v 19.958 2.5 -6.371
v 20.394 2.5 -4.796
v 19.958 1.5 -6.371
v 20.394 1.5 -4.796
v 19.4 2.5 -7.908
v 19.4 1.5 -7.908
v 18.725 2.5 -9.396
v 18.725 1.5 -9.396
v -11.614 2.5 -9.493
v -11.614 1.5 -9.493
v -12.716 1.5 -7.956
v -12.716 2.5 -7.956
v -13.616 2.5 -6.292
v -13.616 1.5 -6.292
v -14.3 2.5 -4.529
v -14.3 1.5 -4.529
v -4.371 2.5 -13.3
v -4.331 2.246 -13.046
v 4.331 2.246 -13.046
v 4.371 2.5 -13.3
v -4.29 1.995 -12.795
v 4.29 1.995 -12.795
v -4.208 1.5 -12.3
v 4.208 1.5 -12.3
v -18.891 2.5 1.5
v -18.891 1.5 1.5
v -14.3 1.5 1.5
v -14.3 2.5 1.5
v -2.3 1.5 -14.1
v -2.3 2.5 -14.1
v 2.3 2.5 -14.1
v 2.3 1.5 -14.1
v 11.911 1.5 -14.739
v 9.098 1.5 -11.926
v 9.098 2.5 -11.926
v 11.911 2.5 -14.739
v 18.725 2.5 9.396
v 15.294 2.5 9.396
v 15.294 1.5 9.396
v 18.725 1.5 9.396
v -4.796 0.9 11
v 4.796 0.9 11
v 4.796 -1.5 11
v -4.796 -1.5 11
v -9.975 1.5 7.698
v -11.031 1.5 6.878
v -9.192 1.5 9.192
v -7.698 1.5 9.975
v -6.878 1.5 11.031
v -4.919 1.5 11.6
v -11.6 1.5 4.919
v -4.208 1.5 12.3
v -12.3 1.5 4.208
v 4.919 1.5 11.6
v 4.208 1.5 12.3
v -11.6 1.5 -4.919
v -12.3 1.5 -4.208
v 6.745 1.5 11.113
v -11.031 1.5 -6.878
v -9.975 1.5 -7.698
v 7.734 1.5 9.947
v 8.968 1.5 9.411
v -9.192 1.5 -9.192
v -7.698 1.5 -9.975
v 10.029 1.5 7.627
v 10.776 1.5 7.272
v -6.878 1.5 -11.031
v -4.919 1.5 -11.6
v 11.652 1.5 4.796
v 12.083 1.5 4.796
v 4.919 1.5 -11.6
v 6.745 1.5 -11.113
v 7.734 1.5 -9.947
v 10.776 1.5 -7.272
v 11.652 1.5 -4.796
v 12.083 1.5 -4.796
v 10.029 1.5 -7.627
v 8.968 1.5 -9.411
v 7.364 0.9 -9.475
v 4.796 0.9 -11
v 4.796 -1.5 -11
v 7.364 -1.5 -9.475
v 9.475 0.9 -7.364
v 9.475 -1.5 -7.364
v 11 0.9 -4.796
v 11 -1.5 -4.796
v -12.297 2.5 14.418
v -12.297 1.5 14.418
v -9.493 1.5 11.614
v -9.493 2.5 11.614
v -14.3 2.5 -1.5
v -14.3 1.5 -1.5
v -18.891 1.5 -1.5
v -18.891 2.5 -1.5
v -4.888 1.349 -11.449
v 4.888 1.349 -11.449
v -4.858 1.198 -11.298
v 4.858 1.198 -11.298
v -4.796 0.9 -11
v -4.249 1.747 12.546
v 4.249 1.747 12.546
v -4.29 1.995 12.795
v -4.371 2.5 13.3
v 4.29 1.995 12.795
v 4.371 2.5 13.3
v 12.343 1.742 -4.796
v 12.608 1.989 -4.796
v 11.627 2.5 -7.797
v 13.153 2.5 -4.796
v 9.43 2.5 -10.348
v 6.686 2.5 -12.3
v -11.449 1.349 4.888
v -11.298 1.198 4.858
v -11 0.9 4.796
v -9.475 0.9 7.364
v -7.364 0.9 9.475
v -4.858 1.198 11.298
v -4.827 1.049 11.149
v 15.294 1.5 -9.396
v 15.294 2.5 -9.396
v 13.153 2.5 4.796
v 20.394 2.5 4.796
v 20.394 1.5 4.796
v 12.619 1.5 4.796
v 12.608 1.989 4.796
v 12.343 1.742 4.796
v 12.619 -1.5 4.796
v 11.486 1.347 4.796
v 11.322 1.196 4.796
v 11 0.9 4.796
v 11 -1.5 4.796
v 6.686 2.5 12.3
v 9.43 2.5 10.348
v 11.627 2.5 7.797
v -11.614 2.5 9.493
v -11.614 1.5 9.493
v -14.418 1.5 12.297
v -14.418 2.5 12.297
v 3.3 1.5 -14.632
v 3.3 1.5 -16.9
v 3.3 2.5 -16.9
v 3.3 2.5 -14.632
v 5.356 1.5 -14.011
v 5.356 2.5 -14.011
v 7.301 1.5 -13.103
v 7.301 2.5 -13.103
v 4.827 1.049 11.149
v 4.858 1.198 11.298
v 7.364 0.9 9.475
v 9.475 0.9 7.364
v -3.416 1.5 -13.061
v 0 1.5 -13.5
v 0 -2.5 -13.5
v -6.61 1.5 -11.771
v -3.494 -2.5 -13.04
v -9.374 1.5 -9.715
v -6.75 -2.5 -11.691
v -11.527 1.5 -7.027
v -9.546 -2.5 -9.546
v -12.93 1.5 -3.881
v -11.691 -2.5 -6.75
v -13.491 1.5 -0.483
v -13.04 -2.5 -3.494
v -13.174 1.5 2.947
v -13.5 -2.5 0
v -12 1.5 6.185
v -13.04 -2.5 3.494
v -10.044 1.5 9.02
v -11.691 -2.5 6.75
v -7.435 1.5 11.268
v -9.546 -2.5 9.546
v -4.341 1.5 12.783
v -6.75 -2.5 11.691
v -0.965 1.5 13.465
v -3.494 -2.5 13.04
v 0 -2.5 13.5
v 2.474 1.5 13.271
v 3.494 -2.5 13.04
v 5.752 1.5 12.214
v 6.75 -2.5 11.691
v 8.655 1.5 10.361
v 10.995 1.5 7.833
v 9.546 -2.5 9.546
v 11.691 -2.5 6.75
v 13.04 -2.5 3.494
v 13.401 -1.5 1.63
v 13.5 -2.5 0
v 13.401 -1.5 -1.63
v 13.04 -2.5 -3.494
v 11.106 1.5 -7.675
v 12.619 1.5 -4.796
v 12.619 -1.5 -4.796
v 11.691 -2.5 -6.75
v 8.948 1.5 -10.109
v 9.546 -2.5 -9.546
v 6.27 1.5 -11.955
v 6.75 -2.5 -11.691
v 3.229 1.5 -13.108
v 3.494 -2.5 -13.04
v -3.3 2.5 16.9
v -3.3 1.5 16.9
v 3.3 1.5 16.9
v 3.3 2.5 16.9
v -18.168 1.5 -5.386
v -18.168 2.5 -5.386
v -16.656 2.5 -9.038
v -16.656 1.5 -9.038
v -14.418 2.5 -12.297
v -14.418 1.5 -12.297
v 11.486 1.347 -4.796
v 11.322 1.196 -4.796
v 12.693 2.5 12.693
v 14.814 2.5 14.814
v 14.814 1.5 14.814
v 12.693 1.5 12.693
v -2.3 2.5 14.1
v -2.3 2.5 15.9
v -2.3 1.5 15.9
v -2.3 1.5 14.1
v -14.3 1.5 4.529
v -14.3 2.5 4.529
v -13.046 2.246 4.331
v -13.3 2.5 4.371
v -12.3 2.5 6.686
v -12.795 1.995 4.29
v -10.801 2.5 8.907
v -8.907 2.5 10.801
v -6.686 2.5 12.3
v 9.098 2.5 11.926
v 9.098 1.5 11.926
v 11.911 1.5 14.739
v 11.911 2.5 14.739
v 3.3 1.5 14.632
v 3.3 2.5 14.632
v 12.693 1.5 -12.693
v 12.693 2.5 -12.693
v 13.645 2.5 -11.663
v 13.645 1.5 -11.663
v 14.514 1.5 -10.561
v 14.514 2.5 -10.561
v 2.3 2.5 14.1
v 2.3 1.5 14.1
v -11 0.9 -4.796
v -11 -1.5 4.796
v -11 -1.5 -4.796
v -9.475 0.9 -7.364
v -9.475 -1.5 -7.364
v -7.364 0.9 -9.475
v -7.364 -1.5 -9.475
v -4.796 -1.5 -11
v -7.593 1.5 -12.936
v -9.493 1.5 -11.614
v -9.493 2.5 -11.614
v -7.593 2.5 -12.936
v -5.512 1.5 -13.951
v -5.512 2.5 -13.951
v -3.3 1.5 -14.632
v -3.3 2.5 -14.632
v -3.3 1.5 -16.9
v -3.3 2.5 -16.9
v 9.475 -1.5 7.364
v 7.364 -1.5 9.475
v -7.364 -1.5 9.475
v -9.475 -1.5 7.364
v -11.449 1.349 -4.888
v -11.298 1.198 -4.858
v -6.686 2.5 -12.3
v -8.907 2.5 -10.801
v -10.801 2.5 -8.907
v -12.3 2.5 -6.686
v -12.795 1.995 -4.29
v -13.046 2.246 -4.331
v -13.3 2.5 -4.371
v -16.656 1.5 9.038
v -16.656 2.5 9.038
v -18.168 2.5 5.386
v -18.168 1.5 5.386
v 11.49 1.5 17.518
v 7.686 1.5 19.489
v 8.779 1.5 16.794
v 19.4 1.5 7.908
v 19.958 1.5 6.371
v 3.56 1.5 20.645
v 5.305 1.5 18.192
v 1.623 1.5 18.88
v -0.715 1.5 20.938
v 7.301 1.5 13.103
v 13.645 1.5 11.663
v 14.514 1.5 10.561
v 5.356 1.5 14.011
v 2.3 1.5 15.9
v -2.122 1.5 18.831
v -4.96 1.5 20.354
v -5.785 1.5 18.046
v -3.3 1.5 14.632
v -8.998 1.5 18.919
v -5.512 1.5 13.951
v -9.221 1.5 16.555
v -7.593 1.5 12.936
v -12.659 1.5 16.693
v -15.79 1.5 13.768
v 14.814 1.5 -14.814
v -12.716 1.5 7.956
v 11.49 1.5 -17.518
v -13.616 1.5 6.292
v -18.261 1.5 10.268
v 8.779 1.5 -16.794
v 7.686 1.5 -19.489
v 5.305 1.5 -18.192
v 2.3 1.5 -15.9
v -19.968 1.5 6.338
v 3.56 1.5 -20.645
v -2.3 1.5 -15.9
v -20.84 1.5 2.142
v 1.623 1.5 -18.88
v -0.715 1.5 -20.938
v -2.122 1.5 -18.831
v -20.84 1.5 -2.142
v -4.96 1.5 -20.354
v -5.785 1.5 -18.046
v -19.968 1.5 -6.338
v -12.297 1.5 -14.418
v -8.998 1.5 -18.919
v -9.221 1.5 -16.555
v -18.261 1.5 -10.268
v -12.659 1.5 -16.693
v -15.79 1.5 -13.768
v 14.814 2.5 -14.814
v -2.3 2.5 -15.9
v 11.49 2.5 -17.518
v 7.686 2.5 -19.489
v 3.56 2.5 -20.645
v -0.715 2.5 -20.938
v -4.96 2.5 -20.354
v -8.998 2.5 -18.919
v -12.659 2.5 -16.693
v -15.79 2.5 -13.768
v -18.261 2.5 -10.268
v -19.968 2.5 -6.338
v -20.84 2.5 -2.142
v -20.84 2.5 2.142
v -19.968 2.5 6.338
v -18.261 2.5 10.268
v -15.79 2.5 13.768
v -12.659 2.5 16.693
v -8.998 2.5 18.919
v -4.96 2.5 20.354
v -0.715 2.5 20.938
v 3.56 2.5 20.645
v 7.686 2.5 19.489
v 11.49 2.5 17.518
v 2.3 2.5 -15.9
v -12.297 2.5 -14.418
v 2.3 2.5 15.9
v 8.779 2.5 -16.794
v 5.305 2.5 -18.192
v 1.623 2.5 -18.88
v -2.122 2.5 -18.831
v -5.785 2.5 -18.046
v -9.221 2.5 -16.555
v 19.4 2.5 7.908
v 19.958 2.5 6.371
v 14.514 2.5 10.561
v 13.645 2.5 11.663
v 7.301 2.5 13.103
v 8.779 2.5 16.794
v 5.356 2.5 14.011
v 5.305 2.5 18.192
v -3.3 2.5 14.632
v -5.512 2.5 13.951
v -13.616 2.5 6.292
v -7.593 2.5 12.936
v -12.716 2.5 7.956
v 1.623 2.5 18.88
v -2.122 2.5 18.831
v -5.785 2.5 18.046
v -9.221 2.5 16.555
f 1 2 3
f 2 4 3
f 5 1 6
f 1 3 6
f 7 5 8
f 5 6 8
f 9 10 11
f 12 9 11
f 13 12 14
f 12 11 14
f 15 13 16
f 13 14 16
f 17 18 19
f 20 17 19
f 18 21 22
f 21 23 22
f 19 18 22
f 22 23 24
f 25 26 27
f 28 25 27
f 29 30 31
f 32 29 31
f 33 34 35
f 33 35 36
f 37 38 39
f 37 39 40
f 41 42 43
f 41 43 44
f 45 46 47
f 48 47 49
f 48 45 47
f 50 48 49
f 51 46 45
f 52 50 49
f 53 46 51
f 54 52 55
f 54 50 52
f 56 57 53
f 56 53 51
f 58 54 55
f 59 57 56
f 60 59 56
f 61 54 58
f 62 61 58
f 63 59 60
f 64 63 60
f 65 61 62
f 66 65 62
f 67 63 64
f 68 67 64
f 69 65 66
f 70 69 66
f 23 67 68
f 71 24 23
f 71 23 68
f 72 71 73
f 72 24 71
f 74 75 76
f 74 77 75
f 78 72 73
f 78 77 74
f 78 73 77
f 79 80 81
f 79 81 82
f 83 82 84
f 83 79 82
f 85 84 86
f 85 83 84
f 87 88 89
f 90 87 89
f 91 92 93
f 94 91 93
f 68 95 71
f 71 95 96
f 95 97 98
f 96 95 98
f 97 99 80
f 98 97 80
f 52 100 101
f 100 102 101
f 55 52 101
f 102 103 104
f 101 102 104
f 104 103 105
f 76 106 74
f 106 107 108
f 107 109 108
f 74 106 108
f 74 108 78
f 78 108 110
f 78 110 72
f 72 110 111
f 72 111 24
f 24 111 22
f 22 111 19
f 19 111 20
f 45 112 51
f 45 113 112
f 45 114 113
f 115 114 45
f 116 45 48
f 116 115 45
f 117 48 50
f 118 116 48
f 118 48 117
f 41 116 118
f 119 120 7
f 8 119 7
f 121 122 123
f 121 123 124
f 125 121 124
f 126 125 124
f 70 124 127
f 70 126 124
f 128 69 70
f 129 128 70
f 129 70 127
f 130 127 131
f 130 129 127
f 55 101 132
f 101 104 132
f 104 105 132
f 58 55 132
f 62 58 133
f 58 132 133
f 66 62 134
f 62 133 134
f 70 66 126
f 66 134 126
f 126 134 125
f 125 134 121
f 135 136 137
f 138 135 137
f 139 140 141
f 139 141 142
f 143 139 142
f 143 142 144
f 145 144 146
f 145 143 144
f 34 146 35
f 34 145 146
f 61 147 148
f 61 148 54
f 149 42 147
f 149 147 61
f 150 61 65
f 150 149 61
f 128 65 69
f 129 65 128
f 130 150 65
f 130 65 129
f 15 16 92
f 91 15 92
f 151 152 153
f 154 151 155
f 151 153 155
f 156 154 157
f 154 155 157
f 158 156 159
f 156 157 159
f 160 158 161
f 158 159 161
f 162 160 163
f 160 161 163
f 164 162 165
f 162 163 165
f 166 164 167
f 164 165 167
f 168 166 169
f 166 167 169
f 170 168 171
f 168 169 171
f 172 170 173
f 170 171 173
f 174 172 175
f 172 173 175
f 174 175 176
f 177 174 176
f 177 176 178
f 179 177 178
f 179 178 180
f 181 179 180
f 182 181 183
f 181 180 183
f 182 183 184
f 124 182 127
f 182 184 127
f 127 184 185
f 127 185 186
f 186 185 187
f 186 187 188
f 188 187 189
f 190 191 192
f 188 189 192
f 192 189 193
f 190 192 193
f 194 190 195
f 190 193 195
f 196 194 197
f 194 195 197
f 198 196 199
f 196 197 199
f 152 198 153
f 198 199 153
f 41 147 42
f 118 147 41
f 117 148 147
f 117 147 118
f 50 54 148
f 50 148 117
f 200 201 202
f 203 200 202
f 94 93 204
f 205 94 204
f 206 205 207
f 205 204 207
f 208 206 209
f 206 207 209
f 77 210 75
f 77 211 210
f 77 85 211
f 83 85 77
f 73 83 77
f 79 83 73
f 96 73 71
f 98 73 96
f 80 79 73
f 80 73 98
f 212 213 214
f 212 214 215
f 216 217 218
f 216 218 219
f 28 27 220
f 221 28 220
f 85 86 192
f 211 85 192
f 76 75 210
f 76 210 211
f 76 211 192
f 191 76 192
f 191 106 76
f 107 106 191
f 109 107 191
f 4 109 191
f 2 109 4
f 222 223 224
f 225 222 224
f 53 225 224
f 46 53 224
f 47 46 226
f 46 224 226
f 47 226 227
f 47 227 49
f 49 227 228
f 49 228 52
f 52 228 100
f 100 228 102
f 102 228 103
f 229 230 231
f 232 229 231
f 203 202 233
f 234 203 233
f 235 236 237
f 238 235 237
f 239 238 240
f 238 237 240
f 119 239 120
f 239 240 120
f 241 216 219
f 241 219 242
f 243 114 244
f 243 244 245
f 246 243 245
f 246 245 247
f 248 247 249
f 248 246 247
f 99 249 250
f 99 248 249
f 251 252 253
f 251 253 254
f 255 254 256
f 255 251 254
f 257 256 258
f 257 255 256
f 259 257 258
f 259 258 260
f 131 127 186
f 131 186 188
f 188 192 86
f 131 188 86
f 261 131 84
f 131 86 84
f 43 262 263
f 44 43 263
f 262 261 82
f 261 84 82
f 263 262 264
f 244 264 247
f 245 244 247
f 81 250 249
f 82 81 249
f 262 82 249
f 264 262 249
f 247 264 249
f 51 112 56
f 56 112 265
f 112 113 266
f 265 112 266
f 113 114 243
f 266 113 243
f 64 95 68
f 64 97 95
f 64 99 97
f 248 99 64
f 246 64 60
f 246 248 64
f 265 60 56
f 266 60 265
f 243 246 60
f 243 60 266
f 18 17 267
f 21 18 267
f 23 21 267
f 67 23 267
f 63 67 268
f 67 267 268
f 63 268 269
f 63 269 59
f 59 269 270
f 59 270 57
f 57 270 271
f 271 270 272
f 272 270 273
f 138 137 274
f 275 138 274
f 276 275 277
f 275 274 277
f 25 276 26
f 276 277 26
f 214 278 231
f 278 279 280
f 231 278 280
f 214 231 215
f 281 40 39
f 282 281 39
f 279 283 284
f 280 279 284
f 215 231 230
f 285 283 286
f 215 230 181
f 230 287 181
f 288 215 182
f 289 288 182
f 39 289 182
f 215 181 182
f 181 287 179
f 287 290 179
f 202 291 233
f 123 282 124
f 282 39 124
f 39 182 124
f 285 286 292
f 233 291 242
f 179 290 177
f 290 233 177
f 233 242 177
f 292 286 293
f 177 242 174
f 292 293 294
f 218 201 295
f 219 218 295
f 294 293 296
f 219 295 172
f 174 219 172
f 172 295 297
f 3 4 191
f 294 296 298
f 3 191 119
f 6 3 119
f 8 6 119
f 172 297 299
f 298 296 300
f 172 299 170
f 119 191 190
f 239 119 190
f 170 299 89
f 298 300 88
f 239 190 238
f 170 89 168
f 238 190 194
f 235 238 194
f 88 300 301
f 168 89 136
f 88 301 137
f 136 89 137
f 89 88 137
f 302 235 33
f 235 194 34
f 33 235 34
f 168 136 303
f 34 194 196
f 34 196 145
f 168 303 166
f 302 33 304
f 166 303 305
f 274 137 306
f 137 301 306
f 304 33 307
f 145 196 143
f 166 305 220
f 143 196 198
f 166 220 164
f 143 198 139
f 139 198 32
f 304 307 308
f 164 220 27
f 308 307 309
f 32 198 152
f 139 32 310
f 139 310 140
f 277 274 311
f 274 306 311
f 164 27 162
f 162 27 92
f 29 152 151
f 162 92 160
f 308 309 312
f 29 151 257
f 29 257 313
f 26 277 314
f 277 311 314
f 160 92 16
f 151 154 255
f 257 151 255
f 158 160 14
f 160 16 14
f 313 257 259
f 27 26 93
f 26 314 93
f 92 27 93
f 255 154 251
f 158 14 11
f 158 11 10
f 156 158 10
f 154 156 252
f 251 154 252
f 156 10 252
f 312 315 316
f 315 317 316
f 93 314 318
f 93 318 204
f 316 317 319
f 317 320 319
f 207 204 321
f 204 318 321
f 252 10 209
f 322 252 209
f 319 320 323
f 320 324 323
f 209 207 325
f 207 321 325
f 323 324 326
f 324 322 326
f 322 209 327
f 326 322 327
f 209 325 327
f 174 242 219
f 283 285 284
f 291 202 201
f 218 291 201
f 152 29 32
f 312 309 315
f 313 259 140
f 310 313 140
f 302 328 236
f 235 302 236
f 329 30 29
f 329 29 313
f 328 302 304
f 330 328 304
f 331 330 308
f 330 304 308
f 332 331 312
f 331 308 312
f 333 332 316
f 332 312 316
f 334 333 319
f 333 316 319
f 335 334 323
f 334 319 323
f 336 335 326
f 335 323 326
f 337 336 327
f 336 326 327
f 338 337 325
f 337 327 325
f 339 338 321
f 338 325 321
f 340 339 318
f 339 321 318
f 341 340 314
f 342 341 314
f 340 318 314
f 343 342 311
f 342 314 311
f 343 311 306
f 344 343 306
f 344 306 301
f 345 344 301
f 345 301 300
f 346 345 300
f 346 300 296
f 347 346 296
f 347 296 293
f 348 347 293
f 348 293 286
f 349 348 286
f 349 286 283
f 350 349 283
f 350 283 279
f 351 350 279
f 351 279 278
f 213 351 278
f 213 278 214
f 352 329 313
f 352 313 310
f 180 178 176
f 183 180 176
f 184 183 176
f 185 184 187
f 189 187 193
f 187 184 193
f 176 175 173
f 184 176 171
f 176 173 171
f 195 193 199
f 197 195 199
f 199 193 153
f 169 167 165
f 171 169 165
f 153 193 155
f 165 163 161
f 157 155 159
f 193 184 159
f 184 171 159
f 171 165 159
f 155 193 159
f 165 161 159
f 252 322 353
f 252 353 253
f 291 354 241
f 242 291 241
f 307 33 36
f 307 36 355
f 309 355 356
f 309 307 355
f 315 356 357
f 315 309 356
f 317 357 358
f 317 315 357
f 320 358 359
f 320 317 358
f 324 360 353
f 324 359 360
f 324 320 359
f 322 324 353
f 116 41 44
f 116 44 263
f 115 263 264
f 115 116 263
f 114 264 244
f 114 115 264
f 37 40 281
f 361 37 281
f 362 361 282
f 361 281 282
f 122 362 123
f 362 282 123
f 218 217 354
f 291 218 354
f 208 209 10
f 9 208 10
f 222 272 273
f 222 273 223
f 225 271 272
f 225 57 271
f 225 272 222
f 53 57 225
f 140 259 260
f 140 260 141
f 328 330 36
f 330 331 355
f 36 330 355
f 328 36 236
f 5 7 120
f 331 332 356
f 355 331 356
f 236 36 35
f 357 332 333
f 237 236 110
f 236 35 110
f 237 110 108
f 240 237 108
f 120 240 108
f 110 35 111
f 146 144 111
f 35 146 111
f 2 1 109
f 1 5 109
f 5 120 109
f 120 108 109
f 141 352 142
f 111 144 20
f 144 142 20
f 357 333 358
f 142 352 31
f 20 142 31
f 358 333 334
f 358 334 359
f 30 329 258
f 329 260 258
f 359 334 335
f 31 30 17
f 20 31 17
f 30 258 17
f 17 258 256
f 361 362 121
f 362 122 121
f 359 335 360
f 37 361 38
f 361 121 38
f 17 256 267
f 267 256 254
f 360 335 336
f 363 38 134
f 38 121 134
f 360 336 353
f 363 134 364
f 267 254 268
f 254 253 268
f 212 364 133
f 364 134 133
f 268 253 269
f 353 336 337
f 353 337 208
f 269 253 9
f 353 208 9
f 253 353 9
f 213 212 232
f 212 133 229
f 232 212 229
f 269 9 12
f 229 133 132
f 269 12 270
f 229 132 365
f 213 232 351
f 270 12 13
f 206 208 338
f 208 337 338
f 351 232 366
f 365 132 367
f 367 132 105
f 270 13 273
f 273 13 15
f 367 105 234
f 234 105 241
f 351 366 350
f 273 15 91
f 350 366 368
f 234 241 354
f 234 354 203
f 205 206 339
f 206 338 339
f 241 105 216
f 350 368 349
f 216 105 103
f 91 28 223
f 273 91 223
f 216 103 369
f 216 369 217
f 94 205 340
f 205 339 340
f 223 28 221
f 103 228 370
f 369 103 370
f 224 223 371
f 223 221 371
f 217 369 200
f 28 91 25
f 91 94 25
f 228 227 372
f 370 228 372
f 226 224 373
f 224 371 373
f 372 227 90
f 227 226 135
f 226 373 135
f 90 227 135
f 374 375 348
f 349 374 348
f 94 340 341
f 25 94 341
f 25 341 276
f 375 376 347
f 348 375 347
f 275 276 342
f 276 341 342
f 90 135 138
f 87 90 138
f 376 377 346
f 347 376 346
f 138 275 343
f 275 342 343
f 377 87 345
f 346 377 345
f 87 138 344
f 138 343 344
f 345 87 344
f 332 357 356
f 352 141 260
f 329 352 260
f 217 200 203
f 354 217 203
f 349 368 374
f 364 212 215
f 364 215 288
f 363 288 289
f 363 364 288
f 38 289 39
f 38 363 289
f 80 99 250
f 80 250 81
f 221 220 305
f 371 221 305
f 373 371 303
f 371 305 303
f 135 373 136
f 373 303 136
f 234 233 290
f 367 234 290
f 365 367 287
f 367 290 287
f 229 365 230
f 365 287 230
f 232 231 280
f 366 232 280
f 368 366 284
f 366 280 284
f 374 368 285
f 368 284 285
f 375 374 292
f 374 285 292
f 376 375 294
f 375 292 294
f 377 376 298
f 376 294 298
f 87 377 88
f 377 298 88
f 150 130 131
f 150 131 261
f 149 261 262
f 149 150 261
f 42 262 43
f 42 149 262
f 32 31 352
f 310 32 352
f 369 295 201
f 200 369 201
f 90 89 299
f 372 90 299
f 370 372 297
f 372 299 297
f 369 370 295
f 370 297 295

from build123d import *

# Parameters (mm, degrees)
SKETCH2_W               = 4.6
SKETCH2_H               = 1.8
WATCH_POSITIONER_DEPTH  = 1
WATCH_HOLDER_V2_DEPTH   = 4
CHAMFER1_SIZE           = 0.6
CUT_EXTRUDE1_DEPTH      = 30.733062405
CUT_EXTRUDE1_DEPTH_BACK = 30.733062405
CHAMFER2_SIZE           = 1


with BuildPart() as part:
    # Front → Base (revolve)
    with BuildSketch(Plane.XY, mode=Mode.PRIVATE) as base_sk:
        Polygon((0, 2.5), (-20.95, 2.5), (-20.95, 1.5), (-13.5, 1.5), (-13.5, -2.5), (0, -2.5), align=None)
    revolve(base_sk.sketch.rotate(Axis((0, 0, 0), (0, 1, 0)), 270), axis=Axis((0, 0, 0), (0, 1, 0)))

    # Sketch2 → Watch Positioner (cut)
    with BuildSketch(Plane(origin=(0, 2.5, 0), x_dir=(1, 0, 0), z_dir=(0, 1, 0))):
        with BuildLine():
            Line((12.3, -4.208325083), (12.3, 4.208325083))
            ThreePointArc((12.3, 4.208325083), (9.192388155, 9.192388155), (4.208325083, 12.3))
            Line((4.208325083, 12.3), (-4.208325083, 12.3))
            ThreePointArc((-4.208325083, 12.3), (-9.192388155, 9.192388155), (-12.3, 4.208325083))
            Line((-12.3, 4.208325083), (-12.3, -4.208325083))
            ThreePointArc((-12.3, -4.208325083), (-9.192388155, -9.192388155), (-4.208325083, -12.3))
            Line((-4.208325083, -12.3), (4.208325083, -12.3))
            ThreePointArc((4.208325083, -12.3), (9.192388155, -9.192388155), (12.3, -4.208325083))
        make_face()
        with Locations((0, 15)):
            Rectangle(SKETCH2_W, SKETCH2_H)
        with Locations((0, -15)):
            Rectangle(SKETCH2_W, SKETCH2_H)
    extrude(amount=-WATCH_POSITIONER_DEPTH, mode=Mode.SUBTRACT)

    # Sketch4 → Watch Holder v2 (cut)
    with BuildSketch(Plane(origin=(0, 2.5, 0), x_dir=(1, 0, 0), z_dir=(0, 1, 0))):
        with BuildLine():
            Line((4.795831523, -11), (-4.795831523, -11))
            ThreePointArc((-4.795831523, -11), (-8.485281374, -8.485281374), (-11, -4.795831523))
            Line((-11, -4.795831523), (-11, 4.795831523))
            ThreePointArc((-11, 4.795831523), (-8.485281374, 8.485281374), (-4.795831523, 11))
            Line((-4.795831523, 11), (4.795831523, 11))
            ThreePointArc((4.795831523, 11), (8.485281374, 8.485281374), (11, 4.795831523))
            Line((11, 4.795831523), (21.95, 4.795831523))
            Line((21.95, 4.795831523), (21.95, -4.795831523))
            Line((21.95, -4.795831523), (11, -4.795831523))
            ThreePointArc((11, -4.795831523), (8.485281374, -8.485281374), (4.795831523, -11))
        make_face()
        with BuildLine():
            Line((15.294471223, 9.395831523), (19.837359955, 9.395831523))
            ThreePointArc((19.837359955, 9.395831523), (17.942483085, 12.643963015), (15.520993847, 15.520993847))
            Line((15.520993847, 15.520993847), (12.692566722, 12.692566722))
            ThreePointArc((12.692566722, 12.692566722), (14.090269301, 11.120558036), (15.294471223, 9.395831523))
        make_face()
        with BuildLine():
            Line((15.520993847, -15.520993847), (12.692566722, -12.692566722))
            ThreePointArc((12.692566722, -12.692566722), (14.090269301, -11.120558036), (15.294471223, -9.395831523))
            Line((15.294471223, -9.395831523), (19.837359955, -9.395831523))
            ThreePointArc((19.837359955, -9.395831523), (17.942483085, -12.643963015), (15.520993847, -15.520993847))
        make_face()
    extrude(amount=-WATCH_HOLDER_V2_DEPTH, mode=Mode.SUBTRACT)

    # Chamfer1
    chamfer1_edges = [part.edges().sort_by_distance(p)[0] for p in [
        (0, 1.5, 11),
        (8.485281374, 1.5, 8.485281374),
        (-8.485281374, 1.5, 8.485281374),
        (-11, 1.5, 0),
        (-8.485281374, 1.5, -8.485281374),
        (0, 1.5, -11),
        (8.485281374, 1.5, -8.485281374),
    ]]
    chamfer(chamfer1_edges, length=CHAMFER1_SIZE)

    # Sketch5 → Cut-Extrude1 (cut, two sides: drawn at the far end of the back side and taken through both)
    with BuildSketch(Plane(origin=(0, 0, 0), x_dir=(1, 0, 0), z_dir=(0, 1, 0)).offset(-CUT_EXTRUDE1_DEPTH_BACK)):
        with BuildLine():
            Line((-12.296968735, 14.418289078), (-9.492775288, 11.614095631))
            ThreePointArc((-9.492775288, 11.614095631), (-6.572021243, 13.483639597), (-3.3, 14.632498078))
            Line((-3.3, 14.632498078), (-3.3, 16.9))
            Line((-3.3, 16.9), (3.3, 16.9))
            Line((3.3, 16.9), (3.3, 14.632498078))
            ThreePointArc((3.3, 14.632498078), (6.344822846, 13.592027923), (9.097684458, 11.926111583))
            Line((9.097684458, 11.926111583), (11.910622272, 14.739049396))
            ThreePointArc((11.910622272, 14.739049396), (-0.251073083, 18.948336663), (-12.296968735, 14.418289078))
        make_face()
        with BuildLine():
            Line((-14.418289078, 12.296968735), (-11.614095631, 9.492775288))
            ThreePointArc((-11.614095631, 9.492775288), (-13.192625168, 7.138251969), (-14.3, 4.52879675))
            Line((-14.3, 4.52879675), (-14.3, 1.5))
            Line((-14.3, 1.5), (-18.890539961, 1.5))
            ThreePointArc((-18.890539961, 1.5), (-17.507517141, 7.251851043), (-14.418289078, 12.296968735))
        make_face()
        with BuildLine():
            Line((-18.890539961, -1.5), (-14.3, -1.5))
            Line((-14.3, -1.5), (-14.3, -4.52879675))
            ThreePointArc((-14.3, -4.52879675), (-13.192625168, -7.138251969), (-11.614095631, -9.492775288))
            Line((-11.614095631, -9.492775288), (-14.418289078, -12.296968735))
            ThreePointArc((-14.418289078, -12.296968735), (-17.507517141, -7.251851043), (-18.890539961, -1.5))
        make_face()
        with BuildLine():
            Line((9.097684458, -11.926111583), (11.910622272, -14.739049396))
            ThreePointArc((11.910622272, -14.739049396), (-0.251073083, -18.948336663), (-12.296968735, -14.418289078))
            Line((-12.296968735, -14.418289078), (-9.492775288, -11.614095631))
            ThreePointArc((-9.492775288, -11.614095631), (-6.572021243, -13.483639597), (-3.3, -14.632498078))
            Line((-3.3, -14.632498078), (-3.3, -16.9))
            Line((-3.3, -16.9), (3.3, -16.9))
            Line((3.3, -16.9), (3.3, -14.632498078))
            ThreePointArc((3.3, -14.632498078), (6.344822846, -13.592027923), (9.097684458, -11.926111583))
        make_face()
    extrude(amount=CUT_EXTRUDE1_DEPTH + CUT_EXTRUDE1_DEPTH_BACK, mode=Mode.SUBTRACT)

    # Chamfer2
    chamfer2_edges = [part.edges().sort_by_distance(p)[0] for p in [
        (8.968295761, 2.5, 9.411146112),
    ]]
    chamfer(chamfer2_edges, length=CHAMFER2_SIZE - 0.0001)  # a hair under: the kernel refuses the full size
    chamfer2_2_edges = [part.edges().sort_by_distance(p)[0] for p in [
        (8.968295761, 2.5, -9.411146112),
    ]]
    chamfer(chamfer2_2_edges, length=CHAMFER2_SIZE - 0.0001)  # a hair under: the kernel refuses the full size
    chamfer2_3_edges = [part.edges().sort_by_distance(p)[0] for p in [
        (-9.192388155, 2.5, 9.192388155),
    ]]
    chamfer(chamfer2_3_edges, length=CHAMFER2_SIZE - 0.0001)  # a hair under: the kernel refuses the full size
    chamfer2_4_edges = [part.edges().sort_by_distance(p)[0] for p in [
        (-9.192388155, 2.5, -9.192388155),
    ]]
    chamfer(chamfer2_4_edges, length=CHAMFER2_SIZE - 0.0001)  # a hair under: the kernel refuses the full size
    chamfer2_5_edges = [part.edges().sort_by_distance(p)[0] for p in [
        (0, 2.5, 12.3),
    ]]
    chamfer(chamfer2_5_edges, length=CHAMFER2_SIZE - 0.0001)  # a hair under: the kernel refuses the full size
    chamfer2_6_edges = [part.edges().sort_by_distance(p)[0] for p in [
        (0, 2.5, -12.3),
    ]]
    chamfer(chamfer2_6_edges, length=CHAMFER2_SIZE - 0.0001)  # a hair under: the kernel refuses the full size
    chamfer2_7_edges = [part.edges().sort_by_distance(p)[0] for p in [
        (-12.3, 2.5, 0),
    ]]
    chamfer(chamfer2_7_edges, length=CHAMFER2_SIZE - 0.0001)  # a hair under: the kernel refuses the full size


solid = part.part
